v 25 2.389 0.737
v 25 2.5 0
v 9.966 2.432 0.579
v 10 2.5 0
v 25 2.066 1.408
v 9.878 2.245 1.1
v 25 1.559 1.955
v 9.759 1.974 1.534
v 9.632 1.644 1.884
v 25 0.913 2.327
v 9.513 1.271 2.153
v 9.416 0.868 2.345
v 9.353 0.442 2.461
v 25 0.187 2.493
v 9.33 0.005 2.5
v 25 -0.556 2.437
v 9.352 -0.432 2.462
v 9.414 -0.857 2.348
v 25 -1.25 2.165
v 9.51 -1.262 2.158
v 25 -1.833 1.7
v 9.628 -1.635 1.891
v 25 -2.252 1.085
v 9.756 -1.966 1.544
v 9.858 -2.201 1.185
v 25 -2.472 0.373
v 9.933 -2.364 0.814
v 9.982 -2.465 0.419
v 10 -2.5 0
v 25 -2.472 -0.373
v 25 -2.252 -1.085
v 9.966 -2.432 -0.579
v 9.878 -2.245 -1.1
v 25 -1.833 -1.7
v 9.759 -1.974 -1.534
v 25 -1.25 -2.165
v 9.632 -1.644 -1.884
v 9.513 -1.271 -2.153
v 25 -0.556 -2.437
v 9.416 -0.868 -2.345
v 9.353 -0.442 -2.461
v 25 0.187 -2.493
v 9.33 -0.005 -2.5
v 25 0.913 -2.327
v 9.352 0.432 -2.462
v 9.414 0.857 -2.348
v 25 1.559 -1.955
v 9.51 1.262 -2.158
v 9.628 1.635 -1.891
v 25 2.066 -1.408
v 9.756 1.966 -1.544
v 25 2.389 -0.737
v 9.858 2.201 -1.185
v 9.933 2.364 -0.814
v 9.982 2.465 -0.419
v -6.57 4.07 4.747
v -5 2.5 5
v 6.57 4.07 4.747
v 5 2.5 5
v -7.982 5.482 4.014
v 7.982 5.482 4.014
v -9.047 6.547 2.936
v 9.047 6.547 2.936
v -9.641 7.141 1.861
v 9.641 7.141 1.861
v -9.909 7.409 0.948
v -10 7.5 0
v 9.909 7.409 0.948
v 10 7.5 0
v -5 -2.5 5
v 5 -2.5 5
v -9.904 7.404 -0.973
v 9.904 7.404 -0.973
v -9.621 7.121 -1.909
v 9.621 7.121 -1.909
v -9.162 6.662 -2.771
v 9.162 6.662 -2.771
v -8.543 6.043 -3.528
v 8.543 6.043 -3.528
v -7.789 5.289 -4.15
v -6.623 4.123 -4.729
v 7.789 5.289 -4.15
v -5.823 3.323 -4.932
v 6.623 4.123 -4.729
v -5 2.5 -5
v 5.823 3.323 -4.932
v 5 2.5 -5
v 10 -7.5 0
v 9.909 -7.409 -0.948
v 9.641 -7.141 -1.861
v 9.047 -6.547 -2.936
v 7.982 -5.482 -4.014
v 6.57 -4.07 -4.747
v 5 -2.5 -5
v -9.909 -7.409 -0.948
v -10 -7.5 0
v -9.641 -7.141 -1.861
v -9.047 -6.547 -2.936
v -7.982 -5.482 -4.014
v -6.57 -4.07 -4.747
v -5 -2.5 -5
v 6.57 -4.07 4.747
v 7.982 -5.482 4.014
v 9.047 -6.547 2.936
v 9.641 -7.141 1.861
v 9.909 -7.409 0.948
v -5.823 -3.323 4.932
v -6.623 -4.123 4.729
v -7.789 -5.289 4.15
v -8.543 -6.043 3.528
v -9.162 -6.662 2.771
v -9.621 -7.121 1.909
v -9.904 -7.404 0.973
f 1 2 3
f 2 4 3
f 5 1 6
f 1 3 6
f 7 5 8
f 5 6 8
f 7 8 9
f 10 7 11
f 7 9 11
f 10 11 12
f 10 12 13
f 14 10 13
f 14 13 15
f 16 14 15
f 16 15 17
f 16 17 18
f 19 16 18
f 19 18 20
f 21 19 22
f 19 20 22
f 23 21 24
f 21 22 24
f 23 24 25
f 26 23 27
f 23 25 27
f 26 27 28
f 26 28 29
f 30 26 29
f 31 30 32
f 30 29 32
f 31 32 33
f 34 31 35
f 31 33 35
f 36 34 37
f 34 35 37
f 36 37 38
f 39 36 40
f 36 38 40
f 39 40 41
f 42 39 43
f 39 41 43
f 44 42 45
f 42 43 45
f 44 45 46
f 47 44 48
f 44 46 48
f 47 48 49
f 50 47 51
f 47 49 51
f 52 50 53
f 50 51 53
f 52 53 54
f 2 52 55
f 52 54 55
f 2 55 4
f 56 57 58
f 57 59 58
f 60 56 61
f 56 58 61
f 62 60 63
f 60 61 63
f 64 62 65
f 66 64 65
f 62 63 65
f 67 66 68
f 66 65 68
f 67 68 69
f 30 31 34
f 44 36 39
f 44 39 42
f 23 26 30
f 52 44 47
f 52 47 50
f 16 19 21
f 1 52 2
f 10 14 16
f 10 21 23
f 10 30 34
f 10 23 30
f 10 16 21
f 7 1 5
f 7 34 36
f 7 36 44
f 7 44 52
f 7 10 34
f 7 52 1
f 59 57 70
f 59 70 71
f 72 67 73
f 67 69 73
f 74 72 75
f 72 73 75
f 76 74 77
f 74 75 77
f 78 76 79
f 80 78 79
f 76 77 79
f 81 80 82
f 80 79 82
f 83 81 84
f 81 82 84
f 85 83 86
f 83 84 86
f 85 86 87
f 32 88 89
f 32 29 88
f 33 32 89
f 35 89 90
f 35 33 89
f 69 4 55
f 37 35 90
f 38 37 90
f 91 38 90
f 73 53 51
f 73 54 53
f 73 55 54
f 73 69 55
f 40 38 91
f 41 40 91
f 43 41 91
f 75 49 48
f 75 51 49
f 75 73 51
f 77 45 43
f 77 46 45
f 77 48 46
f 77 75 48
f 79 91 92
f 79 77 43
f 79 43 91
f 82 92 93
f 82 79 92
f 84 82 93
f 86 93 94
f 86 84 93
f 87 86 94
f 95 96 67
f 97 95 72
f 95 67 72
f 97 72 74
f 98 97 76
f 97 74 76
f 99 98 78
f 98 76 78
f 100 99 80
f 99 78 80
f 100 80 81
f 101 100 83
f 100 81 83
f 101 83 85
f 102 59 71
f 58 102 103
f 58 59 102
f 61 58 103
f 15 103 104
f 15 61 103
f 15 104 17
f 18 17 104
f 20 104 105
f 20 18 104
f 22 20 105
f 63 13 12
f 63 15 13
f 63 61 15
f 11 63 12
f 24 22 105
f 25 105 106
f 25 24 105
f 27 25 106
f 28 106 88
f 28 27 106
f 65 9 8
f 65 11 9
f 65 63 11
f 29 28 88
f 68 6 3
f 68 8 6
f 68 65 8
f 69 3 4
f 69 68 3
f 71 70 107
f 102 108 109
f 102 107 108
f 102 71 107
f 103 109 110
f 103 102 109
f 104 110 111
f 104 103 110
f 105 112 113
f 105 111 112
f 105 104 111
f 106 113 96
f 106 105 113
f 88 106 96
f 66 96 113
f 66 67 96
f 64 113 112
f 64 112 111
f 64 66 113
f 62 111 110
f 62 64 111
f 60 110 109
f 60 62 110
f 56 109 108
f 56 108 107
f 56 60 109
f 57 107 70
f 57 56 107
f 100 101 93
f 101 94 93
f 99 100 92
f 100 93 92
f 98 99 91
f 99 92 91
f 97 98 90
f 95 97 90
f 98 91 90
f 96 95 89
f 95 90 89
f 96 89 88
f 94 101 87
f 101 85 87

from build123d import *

# Parameters (mm, degrees)
F0_W     = 20
F0_H     = 15
F1_DEPTH = 5
F2_R     = 4.99999
F3_R     = 2.5
F4_DEPTH = 25


# Not quite as in the source:
# - a fillet or chamfer is up to 0.001 mm smaller than in the source, because OpenCascade refuses the exact size


with BuildPart() as f1:
    # F0 (on Top) → F1 (new body, symmetric)
    with BuildSketch(Plane.XY):
        Rectangle(F0_W, F0_H)
    extrude(amount=F1_DEPTH, both=True)

    # F2 (radius 5 in the source; OpenCascade refuses exactly that, so slightly less here)
    f2_edges = [f1.edges().sort_by_distance(p)[0] for p in [
        (0, 7.5, 5),
        (-10, 0, 5),
        (0, -7.5, 5),
        (10, 0, 5),
        (0, -7.5, -5),
        (10, 0, -5),
        (0, 7.5, -5),
        (-10, 0, -5),
    ]]
    fillet(f2_edges, radius=F2_R)

    # F3 (on Right) → F4 (join)
    with BuildSketch(Plane.YZ):
        Circle(F3_R)
    extrude(amount=F4_DEPTH)


solid = f1.part
